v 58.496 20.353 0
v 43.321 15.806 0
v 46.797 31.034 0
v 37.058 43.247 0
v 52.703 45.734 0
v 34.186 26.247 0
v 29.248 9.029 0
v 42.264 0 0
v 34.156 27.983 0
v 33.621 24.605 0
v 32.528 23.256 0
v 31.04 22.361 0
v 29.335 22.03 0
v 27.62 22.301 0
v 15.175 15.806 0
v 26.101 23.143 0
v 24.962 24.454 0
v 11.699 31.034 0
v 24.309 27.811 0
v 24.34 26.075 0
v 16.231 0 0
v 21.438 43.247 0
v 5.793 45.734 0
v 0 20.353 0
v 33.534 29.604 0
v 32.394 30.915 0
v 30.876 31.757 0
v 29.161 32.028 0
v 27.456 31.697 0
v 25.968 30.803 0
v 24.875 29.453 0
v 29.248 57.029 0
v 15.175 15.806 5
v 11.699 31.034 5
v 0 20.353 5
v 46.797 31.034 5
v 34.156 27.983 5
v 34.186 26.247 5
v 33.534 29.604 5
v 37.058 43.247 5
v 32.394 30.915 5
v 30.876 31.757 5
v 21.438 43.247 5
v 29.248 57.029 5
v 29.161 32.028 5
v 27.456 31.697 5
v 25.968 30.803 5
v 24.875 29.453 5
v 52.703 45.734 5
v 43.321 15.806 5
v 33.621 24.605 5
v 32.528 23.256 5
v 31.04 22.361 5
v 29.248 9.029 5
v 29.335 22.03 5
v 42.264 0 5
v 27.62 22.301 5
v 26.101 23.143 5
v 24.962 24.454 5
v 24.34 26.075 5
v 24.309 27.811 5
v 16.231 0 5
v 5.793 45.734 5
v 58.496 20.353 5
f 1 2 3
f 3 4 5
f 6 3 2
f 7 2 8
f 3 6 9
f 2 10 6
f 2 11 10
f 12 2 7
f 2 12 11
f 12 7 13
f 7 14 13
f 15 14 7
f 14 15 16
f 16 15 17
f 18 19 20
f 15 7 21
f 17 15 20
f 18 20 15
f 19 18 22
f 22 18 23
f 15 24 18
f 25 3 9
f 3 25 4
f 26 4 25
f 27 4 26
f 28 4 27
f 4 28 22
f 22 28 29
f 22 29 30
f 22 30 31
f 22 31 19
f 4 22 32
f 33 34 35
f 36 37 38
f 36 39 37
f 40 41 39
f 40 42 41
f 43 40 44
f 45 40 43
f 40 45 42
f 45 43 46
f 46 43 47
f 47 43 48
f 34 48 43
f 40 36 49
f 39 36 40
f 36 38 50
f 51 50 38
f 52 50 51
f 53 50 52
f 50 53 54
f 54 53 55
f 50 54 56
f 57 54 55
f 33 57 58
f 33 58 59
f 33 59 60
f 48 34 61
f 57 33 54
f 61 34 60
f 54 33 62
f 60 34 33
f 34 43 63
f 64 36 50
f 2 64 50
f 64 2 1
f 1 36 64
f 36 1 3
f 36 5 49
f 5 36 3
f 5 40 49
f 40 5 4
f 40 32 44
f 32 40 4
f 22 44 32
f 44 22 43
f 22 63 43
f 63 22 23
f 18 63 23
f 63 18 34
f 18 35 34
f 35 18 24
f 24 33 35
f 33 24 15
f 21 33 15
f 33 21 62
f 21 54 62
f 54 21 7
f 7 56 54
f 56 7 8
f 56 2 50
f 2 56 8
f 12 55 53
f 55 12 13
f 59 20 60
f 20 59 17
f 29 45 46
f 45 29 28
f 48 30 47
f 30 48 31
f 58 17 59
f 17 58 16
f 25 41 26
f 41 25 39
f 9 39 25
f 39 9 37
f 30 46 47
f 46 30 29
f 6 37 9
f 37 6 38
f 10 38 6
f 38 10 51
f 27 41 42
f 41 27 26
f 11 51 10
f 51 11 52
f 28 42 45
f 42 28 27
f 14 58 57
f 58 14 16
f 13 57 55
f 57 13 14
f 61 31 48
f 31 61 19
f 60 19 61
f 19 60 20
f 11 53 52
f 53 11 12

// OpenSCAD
$fn = 32;

// ----------------------------------------------------------------------
// Star wheel: 7-point star, R30
// ----------------------------------------------------------------------

// --- parameters (mm) ---
n_points = 7;             // number of points / teeth
r_out = 30;               // tip radius
r_in = 18;                // root radius
bore_r = 5;               // centre bore radius
plate_t = 5;              // plate thickness, Z (extrusion height)
bore_d = 10;              // centre bore diameter

profile = [[29.248, 57.029], [21.438, 43.247], [5.793, 45.734], [11.699, 31.034], [0, 20.353], [15.175, 15.806], [16.231, 0], [29.248, 9.029], [42.264, 0], [43.321, 15.806], [58.496, 20.353], [46.797, 31.034], [52.703, 45.734], [37.058, 43.247]];  // primary outline, 14 points, counter clockwise
void_1 = [[34.156, 27.983], [33.534, 29.604], [32.394, 30.915], [30.876, 31.757], [29.161, 32.028], [27.456, 31.697], [25.968, 30.803], [24.875, 29.453], [24.309, 27.811], [24.34, 26.075], [24.962, 24.454], [26.101, 23.143], [27.62, 22.301], [29.335, 22.03], [31.04, 22.361], [32.528, 23.256], [33.621, 24.605], [34.186, 26.247]];  // centre bore, 18 points

// --- the one profile operation ---
difference() {
  linear_extrude(height = plate_t) polygon(points = profile);
  translate([0, 0, -1])
    linear_extrude(height = plate_t + 2) polygon(points = void_1);
}
